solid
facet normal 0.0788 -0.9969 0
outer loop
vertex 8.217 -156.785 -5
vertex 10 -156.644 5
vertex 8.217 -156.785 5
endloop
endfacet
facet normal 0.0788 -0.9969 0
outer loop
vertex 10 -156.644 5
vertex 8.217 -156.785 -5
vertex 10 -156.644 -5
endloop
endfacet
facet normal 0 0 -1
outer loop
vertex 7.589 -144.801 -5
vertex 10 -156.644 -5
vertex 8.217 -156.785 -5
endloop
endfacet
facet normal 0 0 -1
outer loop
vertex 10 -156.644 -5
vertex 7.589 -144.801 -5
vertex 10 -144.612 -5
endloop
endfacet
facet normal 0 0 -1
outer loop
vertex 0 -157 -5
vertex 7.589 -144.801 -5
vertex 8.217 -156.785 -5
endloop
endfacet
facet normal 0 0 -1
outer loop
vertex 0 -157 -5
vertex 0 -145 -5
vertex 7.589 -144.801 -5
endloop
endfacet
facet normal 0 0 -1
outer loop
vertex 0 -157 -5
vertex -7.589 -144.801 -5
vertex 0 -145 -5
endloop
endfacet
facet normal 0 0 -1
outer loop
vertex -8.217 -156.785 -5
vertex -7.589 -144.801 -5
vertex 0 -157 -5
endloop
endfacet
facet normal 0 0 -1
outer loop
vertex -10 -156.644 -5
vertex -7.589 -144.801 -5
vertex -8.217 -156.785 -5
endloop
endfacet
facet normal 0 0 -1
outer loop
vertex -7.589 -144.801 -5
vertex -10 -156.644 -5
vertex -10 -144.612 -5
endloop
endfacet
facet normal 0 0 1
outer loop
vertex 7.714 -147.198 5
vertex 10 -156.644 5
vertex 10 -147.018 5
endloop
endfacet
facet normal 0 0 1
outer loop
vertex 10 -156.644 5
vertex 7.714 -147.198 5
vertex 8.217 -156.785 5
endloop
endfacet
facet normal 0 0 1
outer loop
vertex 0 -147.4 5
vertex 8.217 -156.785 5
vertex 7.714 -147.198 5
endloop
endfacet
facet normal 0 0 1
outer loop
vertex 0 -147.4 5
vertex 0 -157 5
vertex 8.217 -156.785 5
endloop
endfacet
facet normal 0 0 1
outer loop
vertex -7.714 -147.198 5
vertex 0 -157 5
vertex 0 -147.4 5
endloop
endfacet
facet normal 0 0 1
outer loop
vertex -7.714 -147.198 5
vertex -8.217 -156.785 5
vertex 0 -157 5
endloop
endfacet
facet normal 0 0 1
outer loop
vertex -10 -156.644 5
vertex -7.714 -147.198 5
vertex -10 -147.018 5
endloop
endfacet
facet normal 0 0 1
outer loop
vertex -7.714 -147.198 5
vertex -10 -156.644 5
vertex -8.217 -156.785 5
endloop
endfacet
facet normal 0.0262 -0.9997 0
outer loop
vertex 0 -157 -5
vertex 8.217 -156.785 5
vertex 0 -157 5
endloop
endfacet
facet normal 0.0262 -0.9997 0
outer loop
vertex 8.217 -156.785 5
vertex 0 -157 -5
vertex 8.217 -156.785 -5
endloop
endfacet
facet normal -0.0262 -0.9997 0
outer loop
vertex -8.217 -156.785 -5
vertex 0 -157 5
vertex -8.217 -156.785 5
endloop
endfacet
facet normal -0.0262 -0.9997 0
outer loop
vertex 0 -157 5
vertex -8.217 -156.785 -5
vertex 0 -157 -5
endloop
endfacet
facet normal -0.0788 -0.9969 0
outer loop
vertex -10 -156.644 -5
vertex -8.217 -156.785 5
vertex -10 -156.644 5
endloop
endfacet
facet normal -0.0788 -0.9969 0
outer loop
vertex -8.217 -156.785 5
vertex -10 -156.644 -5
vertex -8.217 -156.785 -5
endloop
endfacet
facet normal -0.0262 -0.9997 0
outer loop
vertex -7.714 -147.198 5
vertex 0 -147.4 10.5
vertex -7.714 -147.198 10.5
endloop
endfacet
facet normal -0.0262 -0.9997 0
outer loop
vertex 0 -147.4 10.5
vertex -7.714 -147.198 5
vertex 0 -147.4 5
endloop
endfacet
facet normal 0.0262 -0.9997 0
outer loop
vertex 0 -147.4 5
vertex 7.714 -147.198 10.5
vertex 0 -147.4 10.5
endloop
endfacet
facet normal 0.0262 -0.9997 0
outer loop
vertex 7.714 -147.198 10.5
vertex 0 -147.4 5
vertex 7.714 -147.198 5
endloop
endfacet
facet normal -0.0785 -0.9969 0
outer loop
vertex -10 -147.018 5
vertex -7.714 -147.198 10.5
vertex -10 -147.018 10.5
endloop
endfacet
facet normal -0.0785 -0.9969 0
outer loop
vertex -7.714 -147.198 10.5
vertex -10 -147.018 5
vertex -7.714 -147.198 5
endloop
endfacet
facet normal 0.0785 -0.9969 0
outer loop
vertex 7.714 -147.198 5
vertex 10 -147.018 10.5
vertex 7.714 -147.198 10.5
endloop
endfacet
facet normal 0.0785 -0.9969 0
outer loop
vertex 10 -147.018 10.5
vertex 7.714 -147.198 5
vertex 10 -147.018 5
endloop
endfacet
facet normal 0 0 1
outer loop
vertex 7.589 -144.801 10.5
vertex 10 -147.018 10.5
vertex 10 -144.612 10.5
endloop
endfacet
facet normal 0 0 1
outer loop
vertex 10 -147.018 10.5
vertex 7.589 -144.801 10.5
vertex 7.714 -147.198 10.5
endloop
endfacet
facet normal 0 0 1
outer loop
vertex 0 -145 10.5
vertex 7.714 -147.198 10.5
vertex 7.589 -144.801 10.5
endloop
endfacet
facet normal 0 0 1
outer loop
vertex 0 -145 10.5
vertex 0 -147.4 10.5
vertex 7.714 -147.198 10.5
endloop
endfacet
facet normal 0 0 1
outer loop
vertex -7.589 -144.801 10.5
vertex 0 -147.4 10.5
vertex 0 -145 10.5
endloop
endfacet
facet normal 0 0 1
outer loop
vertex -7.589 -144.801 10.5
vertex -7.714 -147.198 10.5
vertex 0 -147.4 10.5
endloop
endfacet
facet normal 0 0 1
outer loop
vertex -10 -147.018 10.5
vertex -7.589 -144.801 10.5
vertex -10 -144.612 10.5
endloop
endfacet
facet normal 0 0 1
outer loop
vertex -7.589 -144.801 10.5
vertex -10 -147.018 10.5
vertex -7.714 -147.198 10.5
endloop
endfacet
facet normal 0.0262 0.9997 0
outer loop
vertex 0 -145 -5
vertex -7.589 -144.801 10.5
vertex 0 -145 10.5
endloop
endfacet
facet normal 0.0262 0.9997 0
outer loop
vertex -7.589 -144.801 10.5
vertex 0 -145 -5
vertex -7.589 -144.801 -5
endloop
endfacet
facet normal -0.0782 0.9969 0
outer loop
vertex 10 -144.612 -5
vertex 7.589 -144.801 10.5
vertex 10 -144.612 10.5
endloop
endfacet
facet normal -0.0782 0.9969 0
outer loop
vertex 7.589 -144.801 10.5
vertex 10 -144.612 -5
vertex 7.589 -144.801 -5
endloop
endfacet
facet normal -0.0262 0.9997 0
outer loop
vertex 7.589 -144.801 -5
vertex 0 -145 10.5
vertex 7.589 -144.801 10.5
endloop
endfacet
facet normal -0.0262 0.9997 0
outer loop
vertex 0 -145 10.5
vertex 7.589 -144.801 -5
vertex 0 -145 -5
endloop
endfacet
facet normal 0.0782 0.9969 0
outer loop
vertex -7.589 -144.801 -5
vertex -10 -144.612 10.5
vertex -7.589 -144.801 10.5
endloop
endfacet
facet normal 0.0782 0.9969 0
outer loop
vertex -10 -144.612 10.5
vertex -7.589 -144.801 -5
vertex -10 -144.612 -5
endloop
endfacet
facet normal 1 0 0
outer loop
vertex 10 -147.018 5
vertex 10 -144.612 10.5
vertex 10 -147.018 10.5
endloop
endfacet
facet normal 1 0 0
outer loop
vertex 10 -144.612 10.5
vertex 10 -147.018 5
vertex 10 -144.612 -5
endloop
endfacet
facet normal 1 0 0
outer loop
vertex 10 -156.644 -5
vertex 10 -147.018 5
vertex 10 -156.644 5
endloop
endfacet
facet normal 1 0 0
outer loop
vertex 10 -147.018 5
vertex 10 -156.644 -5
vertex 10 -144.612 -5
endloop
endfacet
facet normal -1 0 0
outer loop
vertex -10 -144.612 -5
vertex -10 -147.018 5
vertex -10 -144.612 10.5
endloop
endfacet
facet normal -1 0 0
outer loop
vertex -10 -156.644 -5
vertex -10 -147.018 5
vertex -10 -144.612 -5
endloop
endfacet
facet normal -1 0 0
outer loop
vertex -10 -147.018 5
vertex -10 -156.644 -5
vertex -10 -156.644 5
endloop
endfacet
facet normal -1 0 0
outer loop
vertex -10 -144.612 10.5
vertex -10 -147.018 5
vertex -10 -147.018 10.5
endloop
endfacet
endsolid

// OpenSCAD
$fn=120;
odiameter=314;
inner_dia=295;
ridge_dia=320;

//full_model();
//%cube([200,200,20]);
//quarter();

spacer();

module spacer(){
    intersection(){
    difference(){
        union(){
            cylinder(d=odiameter, h=10, center=true);
            translate([0,0,3])
                cylinder(d=inner_dia-0.2, h=15, center=true);
        }
        cylinder(d=inner_dia-5, h=50, center=true);
    }
        translate([0,-inner_dia/2,3]) cube([20,20,30], center=true);
    }
}

module quarter(){
    
    difference(){
        intersection(){
            full_model();
            translate([0,0,-15]) cube([200,200,40]);
        }
        for(ZR=[0,90]) rotate([0,0,ZR]) 
         translate([(inner_dia+(odiameter-inner_dia)/2)/2,0,-3]) 
            rotate([90,0,0]) cylinder(d=3.3, h=25, center=true);
        translate([0,15,0])
        hull(){
        translate([(inner_dia+(odiameter-inner_dia)/2)/2,0,-3]) 
            rotate([90,0,0]) cylinder(d=8, h=20, center=true);
        translate([10+(inner_dia+(odiameter-inner_dia)/2)/2,0,-3]) 
            rotate([90,0,0]) cylinder(d=8, h=20, center=true);
        }
        translate([5,1+(inner_dia+(odiameter-inner_dia)/2)/2,-3])
            cube([2.4,10,5.4], center=true);
    }
}

module full_model(){
    difference(){
        union(){
//            cylinder(d=ridge_dia, h=3, center=true);
            translate([0,0,-3]) 
                cylinder(d=odiameter, h=10, center=true);
            translate([0,0,9])
            cylinder(d1=308, d2=304, h=15, center=true);
        }
        cylinder(d=inner_dia, h=50, center=true);
    }
}
